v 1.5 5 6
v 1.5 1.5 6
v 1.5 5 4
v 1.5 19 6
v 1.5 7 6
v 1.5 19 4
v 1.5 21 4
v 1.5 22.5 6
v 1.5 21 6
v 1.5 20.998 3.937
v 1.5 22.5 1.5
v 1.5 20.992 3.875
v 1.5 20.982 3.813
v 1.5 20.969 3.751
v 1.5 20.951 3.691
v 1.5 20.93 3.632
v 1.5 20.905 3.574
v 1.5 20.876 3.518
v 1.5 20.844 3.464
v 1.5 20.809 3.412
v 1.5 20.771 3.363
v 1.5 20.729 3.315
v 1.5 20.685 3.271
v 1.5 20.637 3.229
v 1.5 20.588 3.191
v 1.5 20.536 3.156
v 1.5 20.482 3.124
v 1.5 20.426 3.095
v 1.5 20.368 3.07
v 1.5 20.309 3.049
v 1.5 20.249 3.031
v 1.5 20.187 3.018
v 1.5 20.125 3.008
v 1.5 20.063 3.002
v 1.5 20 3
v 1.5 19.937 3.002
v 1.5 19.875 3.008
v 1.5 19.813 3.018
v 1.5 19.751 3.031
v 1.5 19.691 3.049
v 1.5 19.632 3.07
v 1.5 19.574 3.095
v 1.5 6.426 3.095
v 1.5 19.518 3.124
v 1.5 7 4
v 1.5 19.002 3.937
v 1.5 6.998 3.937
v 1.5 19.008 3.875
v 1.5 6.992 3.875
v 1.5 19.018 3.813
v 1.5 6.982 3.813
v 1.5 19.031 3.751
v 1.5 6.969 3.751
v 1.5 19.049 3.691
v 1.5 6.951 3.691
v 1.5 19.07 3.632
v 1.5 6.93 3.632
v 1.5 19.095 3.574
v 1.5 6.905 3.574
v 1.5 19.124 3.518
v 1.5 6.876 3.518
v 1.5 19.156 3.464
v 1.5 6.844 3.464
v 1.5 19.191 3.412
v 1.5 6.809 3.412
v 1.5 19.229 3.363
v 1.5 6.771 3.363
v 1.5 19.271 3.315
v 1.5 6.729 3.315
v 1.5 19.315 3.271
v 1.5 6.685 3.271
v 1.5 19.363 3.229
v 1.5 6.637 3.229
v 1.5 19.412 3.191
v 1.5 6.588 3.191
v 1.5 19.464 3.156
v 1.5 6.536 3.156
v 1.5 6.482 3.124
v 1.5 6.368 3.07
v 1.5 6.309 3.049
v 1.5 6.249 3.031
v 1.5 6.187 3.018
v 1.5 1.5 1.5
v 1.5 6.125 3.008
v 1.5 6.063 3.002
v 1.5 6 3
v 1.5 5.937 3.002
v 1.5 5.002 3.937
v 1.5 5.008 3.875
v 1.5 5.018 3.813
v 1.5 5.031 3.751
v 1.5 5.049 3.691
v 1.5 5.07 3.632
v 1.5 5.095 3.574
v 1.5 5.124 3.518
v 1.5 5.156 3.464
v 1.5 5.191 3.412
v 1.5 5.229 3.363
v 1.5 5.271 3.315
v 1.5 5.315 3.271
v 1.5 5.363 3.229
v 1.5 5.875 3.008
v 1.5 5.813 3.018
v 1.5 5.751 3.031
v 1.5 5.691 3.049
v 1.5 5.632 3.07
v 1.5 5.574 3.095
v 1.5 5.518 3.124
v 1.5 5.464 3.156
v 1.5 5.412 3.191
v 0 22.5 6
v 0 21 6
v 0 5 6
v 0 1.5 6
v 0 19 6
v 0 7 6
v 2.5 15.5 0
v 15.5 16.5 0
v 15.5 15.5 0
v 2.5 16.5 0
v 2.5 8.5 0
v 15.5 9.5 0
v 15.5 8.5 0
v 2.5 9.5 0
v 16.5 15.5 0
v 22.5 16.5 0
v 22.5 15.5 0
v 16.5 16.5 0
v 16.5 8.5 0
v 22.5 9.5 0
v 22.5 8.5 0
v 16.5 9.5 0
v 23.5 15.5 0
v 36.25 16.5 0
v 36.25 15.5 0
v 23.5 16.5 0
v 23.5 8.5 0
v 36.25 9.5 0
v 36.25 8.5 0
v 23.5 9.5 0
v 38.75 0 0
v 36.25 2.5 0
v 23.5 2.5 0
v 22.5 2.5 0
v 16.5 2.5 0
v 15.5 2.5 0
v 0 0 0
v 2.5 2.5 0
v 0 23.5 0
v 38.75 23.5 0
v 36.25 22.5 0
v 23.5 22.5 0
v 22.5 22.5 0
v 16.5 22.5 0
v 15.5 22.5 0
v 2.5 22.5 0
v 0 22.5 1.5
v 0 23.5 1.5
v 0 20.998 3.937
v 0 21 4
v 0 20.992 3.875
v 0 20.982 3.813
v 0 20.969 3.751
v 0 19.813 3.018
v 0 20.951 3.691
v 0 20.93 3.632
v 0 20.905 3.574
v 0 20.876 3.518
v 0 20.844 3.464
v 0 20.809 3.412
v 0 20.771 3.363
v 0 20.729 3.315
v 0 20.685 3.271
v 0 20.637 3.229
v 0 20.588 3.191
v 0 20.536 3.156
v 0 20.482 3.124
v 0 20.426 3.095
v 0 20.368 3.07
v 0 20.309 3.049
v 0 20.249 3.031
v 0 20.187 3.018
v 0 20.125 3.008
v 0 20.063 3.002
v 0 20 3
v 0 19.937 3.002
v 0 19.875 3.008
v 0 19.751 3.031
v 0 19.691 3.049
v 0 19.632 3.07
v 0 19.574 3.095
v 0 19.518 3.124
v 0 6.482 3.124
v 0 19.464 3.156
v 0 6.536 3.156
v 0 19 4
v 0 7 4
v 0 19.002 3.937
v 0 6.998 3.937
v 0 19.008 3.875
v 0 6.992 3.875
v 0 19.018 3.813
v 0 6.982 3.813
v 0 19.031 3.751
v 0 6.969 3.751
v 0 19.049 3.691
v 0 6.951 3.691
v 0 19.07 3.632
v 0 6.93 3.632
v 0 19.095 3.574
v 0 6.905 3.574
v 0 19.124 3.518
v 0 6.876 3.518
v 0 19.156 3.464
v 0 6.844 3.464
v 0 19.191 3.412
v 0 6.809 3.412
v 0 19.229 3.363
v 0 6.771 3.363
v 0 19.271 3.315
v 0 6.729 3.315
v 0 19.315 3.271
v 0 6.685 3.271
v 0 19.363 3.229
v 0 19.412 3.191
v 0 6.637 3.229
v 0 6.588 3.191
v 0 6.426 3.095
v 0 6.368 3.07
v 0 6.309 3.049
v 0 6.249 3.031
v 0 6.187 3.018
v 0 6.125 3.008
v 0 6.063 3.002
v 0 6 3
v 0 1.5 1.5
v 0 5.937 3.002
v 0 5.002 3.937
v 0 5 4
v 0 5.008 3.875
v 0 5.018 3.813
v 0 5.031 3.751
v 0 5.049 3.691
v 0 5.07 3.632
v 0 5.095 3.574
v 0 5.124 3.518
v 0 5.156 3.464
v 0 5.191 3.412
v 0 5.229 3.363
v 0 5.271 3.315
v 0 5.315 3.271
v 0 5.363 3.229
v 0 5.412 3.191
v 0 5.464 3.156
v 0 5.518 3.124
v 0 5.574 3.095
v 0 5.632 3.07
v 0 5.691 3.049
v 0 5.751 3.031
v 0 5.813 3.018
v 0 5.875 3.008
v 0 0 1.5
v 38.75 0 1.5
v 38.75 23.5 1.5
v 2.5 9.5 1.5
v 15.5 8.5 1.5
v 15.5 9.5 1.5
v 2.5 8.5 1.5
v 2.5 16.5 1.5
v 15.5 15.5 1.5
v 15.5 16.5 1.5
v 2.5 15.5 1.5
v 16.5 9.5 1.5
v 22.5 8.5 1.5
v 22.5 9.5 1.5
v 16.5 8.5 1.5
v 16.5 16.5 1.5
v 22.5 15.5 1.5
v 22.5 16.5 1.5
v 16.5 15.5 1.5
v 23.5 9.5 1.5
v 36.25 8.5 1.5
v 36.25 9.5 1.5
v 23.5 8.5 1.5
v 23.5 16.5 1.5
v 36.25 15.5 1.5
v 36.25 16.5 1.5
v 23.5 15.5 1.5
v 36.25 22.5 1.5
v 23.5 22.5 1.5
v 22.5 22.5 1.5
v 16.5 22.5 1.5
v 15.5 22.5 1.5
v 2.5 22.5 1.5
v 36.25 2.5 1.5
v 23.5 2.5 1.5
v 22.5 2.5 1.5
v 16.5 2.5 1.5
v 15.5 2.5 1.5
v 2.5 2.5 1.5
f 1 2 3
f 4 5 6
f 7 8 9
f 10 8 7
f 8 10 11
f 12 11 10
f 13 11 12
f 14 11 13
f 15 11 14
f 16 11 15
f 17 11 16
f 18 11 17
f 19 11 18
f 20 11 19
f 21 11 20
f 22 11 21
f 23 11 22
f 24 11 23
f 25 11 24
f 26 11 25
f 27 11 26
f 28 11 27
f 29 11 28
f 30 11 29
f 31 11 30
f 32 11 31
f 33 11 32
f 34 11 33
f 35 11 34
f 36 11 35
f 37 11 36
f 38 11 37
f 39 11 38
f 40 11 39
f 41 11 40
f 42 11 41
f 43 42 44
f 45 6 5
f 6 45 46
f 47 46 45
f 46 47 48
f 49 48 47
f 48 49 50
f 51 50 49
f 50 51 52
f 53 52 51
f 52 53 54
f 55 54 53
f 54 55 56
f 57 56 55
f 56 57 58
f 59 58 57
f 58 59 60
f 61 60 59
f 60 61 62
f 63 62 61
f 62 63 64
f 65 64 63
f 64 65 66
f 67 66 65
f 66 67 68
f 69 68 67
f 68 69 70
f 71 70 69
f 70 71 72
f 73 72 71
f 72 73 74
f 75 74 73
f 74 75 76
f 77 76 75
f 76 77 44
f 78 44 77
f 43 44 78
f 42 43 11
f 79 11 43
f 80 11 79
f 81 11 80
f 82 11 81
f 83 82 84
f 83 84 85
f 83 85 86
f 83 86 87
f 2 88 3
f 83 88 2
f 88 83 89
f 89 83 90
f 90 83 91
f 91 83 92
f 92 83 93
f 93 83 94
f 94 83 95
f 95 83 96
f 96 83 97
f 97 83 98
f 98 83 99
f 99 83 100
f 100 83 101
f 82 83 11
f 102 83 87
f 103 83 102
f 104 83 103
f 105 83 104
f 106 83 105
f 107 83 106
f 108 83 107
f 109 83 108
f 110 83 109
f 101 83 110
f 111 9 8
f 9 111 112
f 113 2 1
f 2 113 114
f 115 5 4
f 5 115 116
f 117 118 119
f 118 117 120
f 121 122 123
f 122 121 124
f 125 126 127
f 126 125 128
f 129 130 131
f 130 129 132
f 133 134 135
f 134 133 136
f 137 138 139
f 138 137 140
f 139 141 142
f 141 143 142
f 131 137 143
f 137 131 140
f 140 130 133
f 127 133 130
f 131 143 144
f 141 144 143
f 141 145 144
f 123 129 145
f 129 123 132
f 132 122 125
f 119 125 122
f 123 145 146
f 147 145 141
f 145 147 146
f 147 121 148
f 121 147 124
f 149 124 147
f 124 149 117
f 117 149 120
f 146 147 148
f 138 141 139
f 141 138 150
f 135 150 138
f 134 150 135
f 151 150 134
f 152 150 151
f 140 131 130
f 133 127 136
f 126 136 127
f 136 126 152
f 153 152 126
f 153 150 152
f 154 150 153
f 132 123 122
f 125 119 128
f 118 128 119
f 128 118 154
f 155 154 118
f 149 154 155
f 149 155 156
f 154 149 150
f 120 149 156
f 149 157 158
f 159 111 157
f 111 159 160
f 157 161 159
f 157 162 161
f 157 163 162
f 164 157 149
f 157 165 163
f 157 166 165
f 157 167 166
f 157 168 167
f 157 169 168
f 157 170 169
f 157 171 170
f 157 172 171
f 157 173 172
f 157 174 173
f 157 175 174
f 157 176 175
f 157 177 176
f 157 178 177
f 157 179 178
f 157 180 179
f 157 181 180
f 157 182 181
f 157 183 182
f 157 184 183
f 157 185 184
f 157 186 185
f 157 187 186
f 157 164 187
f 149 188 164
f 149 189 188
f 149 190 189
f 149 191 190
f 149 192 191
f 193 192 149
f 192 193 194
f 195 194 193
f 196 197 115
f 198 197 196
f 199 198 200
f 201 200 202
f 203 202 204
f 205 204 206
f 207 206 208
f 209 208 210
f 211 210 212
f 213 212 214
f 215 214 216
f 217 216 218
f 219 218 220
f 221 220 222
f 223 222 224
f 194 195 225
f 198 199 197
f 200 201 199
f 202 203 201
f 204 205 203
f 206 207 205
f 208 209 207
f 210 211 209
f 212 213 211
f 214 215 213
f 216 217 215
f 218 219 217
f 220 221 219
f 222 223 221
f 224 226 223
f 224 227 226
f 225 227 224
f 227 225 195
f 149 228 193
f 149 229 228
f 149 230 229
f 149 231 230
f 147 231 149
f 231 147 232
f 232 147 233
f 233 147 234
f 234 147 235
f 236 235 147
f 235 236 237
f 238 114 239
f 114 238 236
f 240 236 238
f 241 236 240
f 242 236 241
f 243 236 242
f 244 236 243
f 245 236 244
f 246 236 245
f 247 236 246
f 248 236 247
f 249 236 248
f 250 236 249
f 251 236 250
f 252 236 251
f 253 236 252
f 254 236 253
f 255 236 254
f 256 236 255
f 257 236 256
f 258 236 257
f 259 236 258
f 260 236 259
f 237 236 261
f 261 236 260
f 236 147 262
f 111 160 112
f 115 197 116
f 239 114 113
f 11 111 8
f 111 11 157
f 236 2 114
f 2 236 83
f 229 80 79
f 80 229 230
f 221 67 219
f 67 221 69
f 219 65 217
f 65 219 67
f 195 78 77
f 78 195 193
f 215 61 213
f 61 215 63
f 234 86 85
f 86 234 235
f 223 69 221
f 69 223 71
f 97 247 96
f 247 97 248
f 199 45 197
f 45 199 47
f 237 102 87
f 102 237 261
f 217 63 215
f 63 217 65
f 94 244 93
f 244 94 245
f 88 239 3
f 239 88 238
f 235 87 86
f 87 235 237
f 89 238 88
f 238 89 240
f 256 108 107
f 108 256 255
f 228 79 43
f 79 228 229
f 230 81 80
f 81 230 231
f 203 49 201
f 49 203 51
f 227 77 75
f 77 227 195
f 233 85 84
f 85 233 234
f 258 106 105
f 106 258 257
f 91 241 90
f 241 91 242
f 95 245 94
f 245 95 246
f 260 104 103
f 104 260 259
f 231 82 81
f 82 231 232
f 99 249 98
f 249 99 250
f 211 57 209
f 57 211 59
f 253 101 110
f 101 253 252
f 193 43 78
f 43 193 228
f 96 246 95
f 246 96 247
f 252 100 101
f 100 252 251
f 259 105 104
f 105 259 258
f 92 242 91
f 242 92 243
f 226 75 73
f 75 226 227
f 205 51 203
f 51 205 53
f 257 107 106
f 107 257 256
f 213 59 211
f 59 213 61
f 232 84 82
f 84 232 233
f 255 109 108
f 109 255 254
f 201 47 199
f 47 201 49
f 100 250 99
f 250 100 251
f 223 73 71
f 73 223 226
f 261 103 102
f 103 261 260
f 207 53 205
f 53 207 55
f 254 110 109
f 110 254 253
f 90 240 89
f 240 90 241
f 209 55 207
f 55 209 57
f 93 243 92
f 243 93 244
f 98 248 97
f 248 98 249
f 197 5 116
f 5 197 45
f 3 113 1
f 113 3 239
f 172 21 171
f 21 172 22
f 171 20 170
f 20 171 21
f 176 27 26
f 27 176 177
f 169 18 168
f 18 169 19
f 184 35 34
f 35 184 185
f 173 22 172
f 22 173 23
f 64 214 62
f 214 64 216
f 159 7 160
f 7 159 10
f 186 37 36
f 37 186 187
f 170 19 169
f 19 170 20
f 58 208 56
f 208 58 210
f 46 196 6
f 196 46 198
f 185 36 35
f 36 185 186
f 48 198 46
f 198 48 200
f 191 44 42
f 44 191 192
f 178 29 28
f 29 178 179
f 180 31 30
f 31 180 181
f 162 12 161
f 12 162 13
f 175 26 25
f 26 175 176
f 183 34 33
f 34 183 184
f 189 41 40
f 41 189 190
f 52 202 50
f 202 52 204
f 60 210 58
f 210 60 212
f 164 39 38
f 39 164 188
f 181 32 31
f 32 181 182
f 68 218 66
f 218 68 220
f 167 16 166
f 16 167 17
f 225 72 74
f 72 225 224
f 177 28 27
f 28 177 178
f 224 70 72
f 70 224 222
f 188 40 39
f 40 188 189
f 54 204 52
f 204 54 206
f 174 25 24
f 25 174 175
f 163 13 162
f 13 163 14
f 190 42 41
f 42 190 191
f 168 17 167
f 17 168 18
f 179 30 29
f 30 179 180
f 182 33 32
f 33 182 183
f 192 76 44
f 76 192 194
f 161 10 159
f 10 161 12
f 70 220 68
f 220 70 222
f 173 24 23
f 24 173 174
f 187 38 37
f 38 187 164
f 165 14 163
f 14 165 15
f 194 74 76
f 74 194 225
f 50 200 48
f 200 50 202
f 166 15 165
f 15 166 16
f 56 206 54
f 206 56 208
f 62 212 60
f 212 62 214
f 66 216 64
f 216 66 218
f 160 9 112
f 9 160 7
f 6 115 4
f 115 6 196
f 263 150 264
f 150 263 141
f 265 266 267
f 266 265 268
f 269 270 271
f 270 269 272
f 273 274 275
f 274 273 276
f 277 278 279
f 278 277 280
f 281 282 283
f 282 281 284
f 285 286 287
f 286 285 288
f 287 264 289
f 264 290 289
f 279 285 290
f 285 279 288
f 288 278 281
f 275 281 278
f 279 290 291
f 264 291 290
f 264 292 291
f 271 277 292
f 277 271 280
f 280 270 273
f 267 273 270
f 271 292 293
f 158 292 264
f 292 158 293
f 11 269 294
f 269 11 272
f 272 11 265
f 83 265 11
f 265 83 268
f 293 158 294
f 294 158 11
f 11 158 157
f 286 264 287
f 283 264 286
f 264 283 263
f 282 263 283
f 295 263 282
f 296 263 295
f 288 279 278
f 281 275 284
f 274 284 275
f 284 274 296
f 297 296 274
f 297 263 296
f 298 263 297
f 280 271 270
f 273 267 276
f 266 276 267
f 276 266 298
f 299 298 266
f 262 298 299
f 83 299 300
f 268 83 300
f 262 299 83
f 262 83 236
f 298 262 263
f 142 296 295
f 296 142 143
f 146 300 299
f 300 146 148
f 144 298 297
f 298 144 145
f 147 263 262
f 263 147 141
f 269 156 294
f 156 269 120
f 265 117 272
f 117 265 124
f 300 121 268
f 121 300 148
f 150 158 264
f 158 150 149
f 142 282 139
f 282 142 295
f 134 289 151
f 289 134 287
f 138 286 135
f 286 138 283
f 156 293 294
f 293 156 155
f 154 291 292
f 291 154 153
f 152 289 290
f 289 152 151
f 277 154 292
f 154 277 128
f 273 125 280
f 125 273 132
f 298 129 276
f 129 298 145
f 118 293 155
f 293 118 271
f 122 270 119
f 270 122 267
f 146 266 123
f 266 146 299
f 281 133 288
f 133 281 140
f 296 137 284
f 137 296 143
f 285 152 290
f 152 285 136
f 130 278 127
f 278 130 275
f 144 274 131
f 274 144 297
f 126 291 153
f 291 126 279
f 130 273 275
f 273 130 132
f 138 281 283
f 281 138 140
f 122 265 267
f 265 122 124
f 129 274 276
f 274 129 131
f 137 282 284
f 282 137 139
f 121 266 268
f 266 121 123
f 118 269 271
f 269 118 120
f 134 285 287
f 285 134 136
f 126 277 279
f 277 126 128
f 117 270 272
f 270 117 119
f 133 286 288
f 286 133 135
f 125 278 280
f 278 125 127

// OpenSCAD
width = 38.75;
height = 23.5;
depth = 1.5;

$fn = $preview ? 8 : 100;

// frame
cube([width,2.5,depth]);

cube([2.5,height,depth]);

translate([width-2.5,0,0])
    cube([2.5,height,depth]);

translate([0,height-1,0])
    cube([width,1,depth]);

// mesh
translate([2.5+13,0,0])
    cube([1,height,depth]);

translate([2.5+13+1+6,0,0])
    cube([1,height,depth]);

translate([0,2.5+6,0])
    cube([width,1,depth]);

translate([0,2.5+6+1+6,0])
    cube([width,1,depth]);

// clip
difference() {
    translate([0,1.5,0])
        cube([1.5,21,6]);

    translate([-1,6,4])
        rotate([0,90,0])
            cylinder(r=1 , h=3);

    translate([-1,5,4])
        cube([3,2,10]);

    translate([-1,20,4])
        rotate([0,90,0])
            cylinder(r=1 , h=3);

    translate([-1,19,4])
        cube([3,2,10]);
}
